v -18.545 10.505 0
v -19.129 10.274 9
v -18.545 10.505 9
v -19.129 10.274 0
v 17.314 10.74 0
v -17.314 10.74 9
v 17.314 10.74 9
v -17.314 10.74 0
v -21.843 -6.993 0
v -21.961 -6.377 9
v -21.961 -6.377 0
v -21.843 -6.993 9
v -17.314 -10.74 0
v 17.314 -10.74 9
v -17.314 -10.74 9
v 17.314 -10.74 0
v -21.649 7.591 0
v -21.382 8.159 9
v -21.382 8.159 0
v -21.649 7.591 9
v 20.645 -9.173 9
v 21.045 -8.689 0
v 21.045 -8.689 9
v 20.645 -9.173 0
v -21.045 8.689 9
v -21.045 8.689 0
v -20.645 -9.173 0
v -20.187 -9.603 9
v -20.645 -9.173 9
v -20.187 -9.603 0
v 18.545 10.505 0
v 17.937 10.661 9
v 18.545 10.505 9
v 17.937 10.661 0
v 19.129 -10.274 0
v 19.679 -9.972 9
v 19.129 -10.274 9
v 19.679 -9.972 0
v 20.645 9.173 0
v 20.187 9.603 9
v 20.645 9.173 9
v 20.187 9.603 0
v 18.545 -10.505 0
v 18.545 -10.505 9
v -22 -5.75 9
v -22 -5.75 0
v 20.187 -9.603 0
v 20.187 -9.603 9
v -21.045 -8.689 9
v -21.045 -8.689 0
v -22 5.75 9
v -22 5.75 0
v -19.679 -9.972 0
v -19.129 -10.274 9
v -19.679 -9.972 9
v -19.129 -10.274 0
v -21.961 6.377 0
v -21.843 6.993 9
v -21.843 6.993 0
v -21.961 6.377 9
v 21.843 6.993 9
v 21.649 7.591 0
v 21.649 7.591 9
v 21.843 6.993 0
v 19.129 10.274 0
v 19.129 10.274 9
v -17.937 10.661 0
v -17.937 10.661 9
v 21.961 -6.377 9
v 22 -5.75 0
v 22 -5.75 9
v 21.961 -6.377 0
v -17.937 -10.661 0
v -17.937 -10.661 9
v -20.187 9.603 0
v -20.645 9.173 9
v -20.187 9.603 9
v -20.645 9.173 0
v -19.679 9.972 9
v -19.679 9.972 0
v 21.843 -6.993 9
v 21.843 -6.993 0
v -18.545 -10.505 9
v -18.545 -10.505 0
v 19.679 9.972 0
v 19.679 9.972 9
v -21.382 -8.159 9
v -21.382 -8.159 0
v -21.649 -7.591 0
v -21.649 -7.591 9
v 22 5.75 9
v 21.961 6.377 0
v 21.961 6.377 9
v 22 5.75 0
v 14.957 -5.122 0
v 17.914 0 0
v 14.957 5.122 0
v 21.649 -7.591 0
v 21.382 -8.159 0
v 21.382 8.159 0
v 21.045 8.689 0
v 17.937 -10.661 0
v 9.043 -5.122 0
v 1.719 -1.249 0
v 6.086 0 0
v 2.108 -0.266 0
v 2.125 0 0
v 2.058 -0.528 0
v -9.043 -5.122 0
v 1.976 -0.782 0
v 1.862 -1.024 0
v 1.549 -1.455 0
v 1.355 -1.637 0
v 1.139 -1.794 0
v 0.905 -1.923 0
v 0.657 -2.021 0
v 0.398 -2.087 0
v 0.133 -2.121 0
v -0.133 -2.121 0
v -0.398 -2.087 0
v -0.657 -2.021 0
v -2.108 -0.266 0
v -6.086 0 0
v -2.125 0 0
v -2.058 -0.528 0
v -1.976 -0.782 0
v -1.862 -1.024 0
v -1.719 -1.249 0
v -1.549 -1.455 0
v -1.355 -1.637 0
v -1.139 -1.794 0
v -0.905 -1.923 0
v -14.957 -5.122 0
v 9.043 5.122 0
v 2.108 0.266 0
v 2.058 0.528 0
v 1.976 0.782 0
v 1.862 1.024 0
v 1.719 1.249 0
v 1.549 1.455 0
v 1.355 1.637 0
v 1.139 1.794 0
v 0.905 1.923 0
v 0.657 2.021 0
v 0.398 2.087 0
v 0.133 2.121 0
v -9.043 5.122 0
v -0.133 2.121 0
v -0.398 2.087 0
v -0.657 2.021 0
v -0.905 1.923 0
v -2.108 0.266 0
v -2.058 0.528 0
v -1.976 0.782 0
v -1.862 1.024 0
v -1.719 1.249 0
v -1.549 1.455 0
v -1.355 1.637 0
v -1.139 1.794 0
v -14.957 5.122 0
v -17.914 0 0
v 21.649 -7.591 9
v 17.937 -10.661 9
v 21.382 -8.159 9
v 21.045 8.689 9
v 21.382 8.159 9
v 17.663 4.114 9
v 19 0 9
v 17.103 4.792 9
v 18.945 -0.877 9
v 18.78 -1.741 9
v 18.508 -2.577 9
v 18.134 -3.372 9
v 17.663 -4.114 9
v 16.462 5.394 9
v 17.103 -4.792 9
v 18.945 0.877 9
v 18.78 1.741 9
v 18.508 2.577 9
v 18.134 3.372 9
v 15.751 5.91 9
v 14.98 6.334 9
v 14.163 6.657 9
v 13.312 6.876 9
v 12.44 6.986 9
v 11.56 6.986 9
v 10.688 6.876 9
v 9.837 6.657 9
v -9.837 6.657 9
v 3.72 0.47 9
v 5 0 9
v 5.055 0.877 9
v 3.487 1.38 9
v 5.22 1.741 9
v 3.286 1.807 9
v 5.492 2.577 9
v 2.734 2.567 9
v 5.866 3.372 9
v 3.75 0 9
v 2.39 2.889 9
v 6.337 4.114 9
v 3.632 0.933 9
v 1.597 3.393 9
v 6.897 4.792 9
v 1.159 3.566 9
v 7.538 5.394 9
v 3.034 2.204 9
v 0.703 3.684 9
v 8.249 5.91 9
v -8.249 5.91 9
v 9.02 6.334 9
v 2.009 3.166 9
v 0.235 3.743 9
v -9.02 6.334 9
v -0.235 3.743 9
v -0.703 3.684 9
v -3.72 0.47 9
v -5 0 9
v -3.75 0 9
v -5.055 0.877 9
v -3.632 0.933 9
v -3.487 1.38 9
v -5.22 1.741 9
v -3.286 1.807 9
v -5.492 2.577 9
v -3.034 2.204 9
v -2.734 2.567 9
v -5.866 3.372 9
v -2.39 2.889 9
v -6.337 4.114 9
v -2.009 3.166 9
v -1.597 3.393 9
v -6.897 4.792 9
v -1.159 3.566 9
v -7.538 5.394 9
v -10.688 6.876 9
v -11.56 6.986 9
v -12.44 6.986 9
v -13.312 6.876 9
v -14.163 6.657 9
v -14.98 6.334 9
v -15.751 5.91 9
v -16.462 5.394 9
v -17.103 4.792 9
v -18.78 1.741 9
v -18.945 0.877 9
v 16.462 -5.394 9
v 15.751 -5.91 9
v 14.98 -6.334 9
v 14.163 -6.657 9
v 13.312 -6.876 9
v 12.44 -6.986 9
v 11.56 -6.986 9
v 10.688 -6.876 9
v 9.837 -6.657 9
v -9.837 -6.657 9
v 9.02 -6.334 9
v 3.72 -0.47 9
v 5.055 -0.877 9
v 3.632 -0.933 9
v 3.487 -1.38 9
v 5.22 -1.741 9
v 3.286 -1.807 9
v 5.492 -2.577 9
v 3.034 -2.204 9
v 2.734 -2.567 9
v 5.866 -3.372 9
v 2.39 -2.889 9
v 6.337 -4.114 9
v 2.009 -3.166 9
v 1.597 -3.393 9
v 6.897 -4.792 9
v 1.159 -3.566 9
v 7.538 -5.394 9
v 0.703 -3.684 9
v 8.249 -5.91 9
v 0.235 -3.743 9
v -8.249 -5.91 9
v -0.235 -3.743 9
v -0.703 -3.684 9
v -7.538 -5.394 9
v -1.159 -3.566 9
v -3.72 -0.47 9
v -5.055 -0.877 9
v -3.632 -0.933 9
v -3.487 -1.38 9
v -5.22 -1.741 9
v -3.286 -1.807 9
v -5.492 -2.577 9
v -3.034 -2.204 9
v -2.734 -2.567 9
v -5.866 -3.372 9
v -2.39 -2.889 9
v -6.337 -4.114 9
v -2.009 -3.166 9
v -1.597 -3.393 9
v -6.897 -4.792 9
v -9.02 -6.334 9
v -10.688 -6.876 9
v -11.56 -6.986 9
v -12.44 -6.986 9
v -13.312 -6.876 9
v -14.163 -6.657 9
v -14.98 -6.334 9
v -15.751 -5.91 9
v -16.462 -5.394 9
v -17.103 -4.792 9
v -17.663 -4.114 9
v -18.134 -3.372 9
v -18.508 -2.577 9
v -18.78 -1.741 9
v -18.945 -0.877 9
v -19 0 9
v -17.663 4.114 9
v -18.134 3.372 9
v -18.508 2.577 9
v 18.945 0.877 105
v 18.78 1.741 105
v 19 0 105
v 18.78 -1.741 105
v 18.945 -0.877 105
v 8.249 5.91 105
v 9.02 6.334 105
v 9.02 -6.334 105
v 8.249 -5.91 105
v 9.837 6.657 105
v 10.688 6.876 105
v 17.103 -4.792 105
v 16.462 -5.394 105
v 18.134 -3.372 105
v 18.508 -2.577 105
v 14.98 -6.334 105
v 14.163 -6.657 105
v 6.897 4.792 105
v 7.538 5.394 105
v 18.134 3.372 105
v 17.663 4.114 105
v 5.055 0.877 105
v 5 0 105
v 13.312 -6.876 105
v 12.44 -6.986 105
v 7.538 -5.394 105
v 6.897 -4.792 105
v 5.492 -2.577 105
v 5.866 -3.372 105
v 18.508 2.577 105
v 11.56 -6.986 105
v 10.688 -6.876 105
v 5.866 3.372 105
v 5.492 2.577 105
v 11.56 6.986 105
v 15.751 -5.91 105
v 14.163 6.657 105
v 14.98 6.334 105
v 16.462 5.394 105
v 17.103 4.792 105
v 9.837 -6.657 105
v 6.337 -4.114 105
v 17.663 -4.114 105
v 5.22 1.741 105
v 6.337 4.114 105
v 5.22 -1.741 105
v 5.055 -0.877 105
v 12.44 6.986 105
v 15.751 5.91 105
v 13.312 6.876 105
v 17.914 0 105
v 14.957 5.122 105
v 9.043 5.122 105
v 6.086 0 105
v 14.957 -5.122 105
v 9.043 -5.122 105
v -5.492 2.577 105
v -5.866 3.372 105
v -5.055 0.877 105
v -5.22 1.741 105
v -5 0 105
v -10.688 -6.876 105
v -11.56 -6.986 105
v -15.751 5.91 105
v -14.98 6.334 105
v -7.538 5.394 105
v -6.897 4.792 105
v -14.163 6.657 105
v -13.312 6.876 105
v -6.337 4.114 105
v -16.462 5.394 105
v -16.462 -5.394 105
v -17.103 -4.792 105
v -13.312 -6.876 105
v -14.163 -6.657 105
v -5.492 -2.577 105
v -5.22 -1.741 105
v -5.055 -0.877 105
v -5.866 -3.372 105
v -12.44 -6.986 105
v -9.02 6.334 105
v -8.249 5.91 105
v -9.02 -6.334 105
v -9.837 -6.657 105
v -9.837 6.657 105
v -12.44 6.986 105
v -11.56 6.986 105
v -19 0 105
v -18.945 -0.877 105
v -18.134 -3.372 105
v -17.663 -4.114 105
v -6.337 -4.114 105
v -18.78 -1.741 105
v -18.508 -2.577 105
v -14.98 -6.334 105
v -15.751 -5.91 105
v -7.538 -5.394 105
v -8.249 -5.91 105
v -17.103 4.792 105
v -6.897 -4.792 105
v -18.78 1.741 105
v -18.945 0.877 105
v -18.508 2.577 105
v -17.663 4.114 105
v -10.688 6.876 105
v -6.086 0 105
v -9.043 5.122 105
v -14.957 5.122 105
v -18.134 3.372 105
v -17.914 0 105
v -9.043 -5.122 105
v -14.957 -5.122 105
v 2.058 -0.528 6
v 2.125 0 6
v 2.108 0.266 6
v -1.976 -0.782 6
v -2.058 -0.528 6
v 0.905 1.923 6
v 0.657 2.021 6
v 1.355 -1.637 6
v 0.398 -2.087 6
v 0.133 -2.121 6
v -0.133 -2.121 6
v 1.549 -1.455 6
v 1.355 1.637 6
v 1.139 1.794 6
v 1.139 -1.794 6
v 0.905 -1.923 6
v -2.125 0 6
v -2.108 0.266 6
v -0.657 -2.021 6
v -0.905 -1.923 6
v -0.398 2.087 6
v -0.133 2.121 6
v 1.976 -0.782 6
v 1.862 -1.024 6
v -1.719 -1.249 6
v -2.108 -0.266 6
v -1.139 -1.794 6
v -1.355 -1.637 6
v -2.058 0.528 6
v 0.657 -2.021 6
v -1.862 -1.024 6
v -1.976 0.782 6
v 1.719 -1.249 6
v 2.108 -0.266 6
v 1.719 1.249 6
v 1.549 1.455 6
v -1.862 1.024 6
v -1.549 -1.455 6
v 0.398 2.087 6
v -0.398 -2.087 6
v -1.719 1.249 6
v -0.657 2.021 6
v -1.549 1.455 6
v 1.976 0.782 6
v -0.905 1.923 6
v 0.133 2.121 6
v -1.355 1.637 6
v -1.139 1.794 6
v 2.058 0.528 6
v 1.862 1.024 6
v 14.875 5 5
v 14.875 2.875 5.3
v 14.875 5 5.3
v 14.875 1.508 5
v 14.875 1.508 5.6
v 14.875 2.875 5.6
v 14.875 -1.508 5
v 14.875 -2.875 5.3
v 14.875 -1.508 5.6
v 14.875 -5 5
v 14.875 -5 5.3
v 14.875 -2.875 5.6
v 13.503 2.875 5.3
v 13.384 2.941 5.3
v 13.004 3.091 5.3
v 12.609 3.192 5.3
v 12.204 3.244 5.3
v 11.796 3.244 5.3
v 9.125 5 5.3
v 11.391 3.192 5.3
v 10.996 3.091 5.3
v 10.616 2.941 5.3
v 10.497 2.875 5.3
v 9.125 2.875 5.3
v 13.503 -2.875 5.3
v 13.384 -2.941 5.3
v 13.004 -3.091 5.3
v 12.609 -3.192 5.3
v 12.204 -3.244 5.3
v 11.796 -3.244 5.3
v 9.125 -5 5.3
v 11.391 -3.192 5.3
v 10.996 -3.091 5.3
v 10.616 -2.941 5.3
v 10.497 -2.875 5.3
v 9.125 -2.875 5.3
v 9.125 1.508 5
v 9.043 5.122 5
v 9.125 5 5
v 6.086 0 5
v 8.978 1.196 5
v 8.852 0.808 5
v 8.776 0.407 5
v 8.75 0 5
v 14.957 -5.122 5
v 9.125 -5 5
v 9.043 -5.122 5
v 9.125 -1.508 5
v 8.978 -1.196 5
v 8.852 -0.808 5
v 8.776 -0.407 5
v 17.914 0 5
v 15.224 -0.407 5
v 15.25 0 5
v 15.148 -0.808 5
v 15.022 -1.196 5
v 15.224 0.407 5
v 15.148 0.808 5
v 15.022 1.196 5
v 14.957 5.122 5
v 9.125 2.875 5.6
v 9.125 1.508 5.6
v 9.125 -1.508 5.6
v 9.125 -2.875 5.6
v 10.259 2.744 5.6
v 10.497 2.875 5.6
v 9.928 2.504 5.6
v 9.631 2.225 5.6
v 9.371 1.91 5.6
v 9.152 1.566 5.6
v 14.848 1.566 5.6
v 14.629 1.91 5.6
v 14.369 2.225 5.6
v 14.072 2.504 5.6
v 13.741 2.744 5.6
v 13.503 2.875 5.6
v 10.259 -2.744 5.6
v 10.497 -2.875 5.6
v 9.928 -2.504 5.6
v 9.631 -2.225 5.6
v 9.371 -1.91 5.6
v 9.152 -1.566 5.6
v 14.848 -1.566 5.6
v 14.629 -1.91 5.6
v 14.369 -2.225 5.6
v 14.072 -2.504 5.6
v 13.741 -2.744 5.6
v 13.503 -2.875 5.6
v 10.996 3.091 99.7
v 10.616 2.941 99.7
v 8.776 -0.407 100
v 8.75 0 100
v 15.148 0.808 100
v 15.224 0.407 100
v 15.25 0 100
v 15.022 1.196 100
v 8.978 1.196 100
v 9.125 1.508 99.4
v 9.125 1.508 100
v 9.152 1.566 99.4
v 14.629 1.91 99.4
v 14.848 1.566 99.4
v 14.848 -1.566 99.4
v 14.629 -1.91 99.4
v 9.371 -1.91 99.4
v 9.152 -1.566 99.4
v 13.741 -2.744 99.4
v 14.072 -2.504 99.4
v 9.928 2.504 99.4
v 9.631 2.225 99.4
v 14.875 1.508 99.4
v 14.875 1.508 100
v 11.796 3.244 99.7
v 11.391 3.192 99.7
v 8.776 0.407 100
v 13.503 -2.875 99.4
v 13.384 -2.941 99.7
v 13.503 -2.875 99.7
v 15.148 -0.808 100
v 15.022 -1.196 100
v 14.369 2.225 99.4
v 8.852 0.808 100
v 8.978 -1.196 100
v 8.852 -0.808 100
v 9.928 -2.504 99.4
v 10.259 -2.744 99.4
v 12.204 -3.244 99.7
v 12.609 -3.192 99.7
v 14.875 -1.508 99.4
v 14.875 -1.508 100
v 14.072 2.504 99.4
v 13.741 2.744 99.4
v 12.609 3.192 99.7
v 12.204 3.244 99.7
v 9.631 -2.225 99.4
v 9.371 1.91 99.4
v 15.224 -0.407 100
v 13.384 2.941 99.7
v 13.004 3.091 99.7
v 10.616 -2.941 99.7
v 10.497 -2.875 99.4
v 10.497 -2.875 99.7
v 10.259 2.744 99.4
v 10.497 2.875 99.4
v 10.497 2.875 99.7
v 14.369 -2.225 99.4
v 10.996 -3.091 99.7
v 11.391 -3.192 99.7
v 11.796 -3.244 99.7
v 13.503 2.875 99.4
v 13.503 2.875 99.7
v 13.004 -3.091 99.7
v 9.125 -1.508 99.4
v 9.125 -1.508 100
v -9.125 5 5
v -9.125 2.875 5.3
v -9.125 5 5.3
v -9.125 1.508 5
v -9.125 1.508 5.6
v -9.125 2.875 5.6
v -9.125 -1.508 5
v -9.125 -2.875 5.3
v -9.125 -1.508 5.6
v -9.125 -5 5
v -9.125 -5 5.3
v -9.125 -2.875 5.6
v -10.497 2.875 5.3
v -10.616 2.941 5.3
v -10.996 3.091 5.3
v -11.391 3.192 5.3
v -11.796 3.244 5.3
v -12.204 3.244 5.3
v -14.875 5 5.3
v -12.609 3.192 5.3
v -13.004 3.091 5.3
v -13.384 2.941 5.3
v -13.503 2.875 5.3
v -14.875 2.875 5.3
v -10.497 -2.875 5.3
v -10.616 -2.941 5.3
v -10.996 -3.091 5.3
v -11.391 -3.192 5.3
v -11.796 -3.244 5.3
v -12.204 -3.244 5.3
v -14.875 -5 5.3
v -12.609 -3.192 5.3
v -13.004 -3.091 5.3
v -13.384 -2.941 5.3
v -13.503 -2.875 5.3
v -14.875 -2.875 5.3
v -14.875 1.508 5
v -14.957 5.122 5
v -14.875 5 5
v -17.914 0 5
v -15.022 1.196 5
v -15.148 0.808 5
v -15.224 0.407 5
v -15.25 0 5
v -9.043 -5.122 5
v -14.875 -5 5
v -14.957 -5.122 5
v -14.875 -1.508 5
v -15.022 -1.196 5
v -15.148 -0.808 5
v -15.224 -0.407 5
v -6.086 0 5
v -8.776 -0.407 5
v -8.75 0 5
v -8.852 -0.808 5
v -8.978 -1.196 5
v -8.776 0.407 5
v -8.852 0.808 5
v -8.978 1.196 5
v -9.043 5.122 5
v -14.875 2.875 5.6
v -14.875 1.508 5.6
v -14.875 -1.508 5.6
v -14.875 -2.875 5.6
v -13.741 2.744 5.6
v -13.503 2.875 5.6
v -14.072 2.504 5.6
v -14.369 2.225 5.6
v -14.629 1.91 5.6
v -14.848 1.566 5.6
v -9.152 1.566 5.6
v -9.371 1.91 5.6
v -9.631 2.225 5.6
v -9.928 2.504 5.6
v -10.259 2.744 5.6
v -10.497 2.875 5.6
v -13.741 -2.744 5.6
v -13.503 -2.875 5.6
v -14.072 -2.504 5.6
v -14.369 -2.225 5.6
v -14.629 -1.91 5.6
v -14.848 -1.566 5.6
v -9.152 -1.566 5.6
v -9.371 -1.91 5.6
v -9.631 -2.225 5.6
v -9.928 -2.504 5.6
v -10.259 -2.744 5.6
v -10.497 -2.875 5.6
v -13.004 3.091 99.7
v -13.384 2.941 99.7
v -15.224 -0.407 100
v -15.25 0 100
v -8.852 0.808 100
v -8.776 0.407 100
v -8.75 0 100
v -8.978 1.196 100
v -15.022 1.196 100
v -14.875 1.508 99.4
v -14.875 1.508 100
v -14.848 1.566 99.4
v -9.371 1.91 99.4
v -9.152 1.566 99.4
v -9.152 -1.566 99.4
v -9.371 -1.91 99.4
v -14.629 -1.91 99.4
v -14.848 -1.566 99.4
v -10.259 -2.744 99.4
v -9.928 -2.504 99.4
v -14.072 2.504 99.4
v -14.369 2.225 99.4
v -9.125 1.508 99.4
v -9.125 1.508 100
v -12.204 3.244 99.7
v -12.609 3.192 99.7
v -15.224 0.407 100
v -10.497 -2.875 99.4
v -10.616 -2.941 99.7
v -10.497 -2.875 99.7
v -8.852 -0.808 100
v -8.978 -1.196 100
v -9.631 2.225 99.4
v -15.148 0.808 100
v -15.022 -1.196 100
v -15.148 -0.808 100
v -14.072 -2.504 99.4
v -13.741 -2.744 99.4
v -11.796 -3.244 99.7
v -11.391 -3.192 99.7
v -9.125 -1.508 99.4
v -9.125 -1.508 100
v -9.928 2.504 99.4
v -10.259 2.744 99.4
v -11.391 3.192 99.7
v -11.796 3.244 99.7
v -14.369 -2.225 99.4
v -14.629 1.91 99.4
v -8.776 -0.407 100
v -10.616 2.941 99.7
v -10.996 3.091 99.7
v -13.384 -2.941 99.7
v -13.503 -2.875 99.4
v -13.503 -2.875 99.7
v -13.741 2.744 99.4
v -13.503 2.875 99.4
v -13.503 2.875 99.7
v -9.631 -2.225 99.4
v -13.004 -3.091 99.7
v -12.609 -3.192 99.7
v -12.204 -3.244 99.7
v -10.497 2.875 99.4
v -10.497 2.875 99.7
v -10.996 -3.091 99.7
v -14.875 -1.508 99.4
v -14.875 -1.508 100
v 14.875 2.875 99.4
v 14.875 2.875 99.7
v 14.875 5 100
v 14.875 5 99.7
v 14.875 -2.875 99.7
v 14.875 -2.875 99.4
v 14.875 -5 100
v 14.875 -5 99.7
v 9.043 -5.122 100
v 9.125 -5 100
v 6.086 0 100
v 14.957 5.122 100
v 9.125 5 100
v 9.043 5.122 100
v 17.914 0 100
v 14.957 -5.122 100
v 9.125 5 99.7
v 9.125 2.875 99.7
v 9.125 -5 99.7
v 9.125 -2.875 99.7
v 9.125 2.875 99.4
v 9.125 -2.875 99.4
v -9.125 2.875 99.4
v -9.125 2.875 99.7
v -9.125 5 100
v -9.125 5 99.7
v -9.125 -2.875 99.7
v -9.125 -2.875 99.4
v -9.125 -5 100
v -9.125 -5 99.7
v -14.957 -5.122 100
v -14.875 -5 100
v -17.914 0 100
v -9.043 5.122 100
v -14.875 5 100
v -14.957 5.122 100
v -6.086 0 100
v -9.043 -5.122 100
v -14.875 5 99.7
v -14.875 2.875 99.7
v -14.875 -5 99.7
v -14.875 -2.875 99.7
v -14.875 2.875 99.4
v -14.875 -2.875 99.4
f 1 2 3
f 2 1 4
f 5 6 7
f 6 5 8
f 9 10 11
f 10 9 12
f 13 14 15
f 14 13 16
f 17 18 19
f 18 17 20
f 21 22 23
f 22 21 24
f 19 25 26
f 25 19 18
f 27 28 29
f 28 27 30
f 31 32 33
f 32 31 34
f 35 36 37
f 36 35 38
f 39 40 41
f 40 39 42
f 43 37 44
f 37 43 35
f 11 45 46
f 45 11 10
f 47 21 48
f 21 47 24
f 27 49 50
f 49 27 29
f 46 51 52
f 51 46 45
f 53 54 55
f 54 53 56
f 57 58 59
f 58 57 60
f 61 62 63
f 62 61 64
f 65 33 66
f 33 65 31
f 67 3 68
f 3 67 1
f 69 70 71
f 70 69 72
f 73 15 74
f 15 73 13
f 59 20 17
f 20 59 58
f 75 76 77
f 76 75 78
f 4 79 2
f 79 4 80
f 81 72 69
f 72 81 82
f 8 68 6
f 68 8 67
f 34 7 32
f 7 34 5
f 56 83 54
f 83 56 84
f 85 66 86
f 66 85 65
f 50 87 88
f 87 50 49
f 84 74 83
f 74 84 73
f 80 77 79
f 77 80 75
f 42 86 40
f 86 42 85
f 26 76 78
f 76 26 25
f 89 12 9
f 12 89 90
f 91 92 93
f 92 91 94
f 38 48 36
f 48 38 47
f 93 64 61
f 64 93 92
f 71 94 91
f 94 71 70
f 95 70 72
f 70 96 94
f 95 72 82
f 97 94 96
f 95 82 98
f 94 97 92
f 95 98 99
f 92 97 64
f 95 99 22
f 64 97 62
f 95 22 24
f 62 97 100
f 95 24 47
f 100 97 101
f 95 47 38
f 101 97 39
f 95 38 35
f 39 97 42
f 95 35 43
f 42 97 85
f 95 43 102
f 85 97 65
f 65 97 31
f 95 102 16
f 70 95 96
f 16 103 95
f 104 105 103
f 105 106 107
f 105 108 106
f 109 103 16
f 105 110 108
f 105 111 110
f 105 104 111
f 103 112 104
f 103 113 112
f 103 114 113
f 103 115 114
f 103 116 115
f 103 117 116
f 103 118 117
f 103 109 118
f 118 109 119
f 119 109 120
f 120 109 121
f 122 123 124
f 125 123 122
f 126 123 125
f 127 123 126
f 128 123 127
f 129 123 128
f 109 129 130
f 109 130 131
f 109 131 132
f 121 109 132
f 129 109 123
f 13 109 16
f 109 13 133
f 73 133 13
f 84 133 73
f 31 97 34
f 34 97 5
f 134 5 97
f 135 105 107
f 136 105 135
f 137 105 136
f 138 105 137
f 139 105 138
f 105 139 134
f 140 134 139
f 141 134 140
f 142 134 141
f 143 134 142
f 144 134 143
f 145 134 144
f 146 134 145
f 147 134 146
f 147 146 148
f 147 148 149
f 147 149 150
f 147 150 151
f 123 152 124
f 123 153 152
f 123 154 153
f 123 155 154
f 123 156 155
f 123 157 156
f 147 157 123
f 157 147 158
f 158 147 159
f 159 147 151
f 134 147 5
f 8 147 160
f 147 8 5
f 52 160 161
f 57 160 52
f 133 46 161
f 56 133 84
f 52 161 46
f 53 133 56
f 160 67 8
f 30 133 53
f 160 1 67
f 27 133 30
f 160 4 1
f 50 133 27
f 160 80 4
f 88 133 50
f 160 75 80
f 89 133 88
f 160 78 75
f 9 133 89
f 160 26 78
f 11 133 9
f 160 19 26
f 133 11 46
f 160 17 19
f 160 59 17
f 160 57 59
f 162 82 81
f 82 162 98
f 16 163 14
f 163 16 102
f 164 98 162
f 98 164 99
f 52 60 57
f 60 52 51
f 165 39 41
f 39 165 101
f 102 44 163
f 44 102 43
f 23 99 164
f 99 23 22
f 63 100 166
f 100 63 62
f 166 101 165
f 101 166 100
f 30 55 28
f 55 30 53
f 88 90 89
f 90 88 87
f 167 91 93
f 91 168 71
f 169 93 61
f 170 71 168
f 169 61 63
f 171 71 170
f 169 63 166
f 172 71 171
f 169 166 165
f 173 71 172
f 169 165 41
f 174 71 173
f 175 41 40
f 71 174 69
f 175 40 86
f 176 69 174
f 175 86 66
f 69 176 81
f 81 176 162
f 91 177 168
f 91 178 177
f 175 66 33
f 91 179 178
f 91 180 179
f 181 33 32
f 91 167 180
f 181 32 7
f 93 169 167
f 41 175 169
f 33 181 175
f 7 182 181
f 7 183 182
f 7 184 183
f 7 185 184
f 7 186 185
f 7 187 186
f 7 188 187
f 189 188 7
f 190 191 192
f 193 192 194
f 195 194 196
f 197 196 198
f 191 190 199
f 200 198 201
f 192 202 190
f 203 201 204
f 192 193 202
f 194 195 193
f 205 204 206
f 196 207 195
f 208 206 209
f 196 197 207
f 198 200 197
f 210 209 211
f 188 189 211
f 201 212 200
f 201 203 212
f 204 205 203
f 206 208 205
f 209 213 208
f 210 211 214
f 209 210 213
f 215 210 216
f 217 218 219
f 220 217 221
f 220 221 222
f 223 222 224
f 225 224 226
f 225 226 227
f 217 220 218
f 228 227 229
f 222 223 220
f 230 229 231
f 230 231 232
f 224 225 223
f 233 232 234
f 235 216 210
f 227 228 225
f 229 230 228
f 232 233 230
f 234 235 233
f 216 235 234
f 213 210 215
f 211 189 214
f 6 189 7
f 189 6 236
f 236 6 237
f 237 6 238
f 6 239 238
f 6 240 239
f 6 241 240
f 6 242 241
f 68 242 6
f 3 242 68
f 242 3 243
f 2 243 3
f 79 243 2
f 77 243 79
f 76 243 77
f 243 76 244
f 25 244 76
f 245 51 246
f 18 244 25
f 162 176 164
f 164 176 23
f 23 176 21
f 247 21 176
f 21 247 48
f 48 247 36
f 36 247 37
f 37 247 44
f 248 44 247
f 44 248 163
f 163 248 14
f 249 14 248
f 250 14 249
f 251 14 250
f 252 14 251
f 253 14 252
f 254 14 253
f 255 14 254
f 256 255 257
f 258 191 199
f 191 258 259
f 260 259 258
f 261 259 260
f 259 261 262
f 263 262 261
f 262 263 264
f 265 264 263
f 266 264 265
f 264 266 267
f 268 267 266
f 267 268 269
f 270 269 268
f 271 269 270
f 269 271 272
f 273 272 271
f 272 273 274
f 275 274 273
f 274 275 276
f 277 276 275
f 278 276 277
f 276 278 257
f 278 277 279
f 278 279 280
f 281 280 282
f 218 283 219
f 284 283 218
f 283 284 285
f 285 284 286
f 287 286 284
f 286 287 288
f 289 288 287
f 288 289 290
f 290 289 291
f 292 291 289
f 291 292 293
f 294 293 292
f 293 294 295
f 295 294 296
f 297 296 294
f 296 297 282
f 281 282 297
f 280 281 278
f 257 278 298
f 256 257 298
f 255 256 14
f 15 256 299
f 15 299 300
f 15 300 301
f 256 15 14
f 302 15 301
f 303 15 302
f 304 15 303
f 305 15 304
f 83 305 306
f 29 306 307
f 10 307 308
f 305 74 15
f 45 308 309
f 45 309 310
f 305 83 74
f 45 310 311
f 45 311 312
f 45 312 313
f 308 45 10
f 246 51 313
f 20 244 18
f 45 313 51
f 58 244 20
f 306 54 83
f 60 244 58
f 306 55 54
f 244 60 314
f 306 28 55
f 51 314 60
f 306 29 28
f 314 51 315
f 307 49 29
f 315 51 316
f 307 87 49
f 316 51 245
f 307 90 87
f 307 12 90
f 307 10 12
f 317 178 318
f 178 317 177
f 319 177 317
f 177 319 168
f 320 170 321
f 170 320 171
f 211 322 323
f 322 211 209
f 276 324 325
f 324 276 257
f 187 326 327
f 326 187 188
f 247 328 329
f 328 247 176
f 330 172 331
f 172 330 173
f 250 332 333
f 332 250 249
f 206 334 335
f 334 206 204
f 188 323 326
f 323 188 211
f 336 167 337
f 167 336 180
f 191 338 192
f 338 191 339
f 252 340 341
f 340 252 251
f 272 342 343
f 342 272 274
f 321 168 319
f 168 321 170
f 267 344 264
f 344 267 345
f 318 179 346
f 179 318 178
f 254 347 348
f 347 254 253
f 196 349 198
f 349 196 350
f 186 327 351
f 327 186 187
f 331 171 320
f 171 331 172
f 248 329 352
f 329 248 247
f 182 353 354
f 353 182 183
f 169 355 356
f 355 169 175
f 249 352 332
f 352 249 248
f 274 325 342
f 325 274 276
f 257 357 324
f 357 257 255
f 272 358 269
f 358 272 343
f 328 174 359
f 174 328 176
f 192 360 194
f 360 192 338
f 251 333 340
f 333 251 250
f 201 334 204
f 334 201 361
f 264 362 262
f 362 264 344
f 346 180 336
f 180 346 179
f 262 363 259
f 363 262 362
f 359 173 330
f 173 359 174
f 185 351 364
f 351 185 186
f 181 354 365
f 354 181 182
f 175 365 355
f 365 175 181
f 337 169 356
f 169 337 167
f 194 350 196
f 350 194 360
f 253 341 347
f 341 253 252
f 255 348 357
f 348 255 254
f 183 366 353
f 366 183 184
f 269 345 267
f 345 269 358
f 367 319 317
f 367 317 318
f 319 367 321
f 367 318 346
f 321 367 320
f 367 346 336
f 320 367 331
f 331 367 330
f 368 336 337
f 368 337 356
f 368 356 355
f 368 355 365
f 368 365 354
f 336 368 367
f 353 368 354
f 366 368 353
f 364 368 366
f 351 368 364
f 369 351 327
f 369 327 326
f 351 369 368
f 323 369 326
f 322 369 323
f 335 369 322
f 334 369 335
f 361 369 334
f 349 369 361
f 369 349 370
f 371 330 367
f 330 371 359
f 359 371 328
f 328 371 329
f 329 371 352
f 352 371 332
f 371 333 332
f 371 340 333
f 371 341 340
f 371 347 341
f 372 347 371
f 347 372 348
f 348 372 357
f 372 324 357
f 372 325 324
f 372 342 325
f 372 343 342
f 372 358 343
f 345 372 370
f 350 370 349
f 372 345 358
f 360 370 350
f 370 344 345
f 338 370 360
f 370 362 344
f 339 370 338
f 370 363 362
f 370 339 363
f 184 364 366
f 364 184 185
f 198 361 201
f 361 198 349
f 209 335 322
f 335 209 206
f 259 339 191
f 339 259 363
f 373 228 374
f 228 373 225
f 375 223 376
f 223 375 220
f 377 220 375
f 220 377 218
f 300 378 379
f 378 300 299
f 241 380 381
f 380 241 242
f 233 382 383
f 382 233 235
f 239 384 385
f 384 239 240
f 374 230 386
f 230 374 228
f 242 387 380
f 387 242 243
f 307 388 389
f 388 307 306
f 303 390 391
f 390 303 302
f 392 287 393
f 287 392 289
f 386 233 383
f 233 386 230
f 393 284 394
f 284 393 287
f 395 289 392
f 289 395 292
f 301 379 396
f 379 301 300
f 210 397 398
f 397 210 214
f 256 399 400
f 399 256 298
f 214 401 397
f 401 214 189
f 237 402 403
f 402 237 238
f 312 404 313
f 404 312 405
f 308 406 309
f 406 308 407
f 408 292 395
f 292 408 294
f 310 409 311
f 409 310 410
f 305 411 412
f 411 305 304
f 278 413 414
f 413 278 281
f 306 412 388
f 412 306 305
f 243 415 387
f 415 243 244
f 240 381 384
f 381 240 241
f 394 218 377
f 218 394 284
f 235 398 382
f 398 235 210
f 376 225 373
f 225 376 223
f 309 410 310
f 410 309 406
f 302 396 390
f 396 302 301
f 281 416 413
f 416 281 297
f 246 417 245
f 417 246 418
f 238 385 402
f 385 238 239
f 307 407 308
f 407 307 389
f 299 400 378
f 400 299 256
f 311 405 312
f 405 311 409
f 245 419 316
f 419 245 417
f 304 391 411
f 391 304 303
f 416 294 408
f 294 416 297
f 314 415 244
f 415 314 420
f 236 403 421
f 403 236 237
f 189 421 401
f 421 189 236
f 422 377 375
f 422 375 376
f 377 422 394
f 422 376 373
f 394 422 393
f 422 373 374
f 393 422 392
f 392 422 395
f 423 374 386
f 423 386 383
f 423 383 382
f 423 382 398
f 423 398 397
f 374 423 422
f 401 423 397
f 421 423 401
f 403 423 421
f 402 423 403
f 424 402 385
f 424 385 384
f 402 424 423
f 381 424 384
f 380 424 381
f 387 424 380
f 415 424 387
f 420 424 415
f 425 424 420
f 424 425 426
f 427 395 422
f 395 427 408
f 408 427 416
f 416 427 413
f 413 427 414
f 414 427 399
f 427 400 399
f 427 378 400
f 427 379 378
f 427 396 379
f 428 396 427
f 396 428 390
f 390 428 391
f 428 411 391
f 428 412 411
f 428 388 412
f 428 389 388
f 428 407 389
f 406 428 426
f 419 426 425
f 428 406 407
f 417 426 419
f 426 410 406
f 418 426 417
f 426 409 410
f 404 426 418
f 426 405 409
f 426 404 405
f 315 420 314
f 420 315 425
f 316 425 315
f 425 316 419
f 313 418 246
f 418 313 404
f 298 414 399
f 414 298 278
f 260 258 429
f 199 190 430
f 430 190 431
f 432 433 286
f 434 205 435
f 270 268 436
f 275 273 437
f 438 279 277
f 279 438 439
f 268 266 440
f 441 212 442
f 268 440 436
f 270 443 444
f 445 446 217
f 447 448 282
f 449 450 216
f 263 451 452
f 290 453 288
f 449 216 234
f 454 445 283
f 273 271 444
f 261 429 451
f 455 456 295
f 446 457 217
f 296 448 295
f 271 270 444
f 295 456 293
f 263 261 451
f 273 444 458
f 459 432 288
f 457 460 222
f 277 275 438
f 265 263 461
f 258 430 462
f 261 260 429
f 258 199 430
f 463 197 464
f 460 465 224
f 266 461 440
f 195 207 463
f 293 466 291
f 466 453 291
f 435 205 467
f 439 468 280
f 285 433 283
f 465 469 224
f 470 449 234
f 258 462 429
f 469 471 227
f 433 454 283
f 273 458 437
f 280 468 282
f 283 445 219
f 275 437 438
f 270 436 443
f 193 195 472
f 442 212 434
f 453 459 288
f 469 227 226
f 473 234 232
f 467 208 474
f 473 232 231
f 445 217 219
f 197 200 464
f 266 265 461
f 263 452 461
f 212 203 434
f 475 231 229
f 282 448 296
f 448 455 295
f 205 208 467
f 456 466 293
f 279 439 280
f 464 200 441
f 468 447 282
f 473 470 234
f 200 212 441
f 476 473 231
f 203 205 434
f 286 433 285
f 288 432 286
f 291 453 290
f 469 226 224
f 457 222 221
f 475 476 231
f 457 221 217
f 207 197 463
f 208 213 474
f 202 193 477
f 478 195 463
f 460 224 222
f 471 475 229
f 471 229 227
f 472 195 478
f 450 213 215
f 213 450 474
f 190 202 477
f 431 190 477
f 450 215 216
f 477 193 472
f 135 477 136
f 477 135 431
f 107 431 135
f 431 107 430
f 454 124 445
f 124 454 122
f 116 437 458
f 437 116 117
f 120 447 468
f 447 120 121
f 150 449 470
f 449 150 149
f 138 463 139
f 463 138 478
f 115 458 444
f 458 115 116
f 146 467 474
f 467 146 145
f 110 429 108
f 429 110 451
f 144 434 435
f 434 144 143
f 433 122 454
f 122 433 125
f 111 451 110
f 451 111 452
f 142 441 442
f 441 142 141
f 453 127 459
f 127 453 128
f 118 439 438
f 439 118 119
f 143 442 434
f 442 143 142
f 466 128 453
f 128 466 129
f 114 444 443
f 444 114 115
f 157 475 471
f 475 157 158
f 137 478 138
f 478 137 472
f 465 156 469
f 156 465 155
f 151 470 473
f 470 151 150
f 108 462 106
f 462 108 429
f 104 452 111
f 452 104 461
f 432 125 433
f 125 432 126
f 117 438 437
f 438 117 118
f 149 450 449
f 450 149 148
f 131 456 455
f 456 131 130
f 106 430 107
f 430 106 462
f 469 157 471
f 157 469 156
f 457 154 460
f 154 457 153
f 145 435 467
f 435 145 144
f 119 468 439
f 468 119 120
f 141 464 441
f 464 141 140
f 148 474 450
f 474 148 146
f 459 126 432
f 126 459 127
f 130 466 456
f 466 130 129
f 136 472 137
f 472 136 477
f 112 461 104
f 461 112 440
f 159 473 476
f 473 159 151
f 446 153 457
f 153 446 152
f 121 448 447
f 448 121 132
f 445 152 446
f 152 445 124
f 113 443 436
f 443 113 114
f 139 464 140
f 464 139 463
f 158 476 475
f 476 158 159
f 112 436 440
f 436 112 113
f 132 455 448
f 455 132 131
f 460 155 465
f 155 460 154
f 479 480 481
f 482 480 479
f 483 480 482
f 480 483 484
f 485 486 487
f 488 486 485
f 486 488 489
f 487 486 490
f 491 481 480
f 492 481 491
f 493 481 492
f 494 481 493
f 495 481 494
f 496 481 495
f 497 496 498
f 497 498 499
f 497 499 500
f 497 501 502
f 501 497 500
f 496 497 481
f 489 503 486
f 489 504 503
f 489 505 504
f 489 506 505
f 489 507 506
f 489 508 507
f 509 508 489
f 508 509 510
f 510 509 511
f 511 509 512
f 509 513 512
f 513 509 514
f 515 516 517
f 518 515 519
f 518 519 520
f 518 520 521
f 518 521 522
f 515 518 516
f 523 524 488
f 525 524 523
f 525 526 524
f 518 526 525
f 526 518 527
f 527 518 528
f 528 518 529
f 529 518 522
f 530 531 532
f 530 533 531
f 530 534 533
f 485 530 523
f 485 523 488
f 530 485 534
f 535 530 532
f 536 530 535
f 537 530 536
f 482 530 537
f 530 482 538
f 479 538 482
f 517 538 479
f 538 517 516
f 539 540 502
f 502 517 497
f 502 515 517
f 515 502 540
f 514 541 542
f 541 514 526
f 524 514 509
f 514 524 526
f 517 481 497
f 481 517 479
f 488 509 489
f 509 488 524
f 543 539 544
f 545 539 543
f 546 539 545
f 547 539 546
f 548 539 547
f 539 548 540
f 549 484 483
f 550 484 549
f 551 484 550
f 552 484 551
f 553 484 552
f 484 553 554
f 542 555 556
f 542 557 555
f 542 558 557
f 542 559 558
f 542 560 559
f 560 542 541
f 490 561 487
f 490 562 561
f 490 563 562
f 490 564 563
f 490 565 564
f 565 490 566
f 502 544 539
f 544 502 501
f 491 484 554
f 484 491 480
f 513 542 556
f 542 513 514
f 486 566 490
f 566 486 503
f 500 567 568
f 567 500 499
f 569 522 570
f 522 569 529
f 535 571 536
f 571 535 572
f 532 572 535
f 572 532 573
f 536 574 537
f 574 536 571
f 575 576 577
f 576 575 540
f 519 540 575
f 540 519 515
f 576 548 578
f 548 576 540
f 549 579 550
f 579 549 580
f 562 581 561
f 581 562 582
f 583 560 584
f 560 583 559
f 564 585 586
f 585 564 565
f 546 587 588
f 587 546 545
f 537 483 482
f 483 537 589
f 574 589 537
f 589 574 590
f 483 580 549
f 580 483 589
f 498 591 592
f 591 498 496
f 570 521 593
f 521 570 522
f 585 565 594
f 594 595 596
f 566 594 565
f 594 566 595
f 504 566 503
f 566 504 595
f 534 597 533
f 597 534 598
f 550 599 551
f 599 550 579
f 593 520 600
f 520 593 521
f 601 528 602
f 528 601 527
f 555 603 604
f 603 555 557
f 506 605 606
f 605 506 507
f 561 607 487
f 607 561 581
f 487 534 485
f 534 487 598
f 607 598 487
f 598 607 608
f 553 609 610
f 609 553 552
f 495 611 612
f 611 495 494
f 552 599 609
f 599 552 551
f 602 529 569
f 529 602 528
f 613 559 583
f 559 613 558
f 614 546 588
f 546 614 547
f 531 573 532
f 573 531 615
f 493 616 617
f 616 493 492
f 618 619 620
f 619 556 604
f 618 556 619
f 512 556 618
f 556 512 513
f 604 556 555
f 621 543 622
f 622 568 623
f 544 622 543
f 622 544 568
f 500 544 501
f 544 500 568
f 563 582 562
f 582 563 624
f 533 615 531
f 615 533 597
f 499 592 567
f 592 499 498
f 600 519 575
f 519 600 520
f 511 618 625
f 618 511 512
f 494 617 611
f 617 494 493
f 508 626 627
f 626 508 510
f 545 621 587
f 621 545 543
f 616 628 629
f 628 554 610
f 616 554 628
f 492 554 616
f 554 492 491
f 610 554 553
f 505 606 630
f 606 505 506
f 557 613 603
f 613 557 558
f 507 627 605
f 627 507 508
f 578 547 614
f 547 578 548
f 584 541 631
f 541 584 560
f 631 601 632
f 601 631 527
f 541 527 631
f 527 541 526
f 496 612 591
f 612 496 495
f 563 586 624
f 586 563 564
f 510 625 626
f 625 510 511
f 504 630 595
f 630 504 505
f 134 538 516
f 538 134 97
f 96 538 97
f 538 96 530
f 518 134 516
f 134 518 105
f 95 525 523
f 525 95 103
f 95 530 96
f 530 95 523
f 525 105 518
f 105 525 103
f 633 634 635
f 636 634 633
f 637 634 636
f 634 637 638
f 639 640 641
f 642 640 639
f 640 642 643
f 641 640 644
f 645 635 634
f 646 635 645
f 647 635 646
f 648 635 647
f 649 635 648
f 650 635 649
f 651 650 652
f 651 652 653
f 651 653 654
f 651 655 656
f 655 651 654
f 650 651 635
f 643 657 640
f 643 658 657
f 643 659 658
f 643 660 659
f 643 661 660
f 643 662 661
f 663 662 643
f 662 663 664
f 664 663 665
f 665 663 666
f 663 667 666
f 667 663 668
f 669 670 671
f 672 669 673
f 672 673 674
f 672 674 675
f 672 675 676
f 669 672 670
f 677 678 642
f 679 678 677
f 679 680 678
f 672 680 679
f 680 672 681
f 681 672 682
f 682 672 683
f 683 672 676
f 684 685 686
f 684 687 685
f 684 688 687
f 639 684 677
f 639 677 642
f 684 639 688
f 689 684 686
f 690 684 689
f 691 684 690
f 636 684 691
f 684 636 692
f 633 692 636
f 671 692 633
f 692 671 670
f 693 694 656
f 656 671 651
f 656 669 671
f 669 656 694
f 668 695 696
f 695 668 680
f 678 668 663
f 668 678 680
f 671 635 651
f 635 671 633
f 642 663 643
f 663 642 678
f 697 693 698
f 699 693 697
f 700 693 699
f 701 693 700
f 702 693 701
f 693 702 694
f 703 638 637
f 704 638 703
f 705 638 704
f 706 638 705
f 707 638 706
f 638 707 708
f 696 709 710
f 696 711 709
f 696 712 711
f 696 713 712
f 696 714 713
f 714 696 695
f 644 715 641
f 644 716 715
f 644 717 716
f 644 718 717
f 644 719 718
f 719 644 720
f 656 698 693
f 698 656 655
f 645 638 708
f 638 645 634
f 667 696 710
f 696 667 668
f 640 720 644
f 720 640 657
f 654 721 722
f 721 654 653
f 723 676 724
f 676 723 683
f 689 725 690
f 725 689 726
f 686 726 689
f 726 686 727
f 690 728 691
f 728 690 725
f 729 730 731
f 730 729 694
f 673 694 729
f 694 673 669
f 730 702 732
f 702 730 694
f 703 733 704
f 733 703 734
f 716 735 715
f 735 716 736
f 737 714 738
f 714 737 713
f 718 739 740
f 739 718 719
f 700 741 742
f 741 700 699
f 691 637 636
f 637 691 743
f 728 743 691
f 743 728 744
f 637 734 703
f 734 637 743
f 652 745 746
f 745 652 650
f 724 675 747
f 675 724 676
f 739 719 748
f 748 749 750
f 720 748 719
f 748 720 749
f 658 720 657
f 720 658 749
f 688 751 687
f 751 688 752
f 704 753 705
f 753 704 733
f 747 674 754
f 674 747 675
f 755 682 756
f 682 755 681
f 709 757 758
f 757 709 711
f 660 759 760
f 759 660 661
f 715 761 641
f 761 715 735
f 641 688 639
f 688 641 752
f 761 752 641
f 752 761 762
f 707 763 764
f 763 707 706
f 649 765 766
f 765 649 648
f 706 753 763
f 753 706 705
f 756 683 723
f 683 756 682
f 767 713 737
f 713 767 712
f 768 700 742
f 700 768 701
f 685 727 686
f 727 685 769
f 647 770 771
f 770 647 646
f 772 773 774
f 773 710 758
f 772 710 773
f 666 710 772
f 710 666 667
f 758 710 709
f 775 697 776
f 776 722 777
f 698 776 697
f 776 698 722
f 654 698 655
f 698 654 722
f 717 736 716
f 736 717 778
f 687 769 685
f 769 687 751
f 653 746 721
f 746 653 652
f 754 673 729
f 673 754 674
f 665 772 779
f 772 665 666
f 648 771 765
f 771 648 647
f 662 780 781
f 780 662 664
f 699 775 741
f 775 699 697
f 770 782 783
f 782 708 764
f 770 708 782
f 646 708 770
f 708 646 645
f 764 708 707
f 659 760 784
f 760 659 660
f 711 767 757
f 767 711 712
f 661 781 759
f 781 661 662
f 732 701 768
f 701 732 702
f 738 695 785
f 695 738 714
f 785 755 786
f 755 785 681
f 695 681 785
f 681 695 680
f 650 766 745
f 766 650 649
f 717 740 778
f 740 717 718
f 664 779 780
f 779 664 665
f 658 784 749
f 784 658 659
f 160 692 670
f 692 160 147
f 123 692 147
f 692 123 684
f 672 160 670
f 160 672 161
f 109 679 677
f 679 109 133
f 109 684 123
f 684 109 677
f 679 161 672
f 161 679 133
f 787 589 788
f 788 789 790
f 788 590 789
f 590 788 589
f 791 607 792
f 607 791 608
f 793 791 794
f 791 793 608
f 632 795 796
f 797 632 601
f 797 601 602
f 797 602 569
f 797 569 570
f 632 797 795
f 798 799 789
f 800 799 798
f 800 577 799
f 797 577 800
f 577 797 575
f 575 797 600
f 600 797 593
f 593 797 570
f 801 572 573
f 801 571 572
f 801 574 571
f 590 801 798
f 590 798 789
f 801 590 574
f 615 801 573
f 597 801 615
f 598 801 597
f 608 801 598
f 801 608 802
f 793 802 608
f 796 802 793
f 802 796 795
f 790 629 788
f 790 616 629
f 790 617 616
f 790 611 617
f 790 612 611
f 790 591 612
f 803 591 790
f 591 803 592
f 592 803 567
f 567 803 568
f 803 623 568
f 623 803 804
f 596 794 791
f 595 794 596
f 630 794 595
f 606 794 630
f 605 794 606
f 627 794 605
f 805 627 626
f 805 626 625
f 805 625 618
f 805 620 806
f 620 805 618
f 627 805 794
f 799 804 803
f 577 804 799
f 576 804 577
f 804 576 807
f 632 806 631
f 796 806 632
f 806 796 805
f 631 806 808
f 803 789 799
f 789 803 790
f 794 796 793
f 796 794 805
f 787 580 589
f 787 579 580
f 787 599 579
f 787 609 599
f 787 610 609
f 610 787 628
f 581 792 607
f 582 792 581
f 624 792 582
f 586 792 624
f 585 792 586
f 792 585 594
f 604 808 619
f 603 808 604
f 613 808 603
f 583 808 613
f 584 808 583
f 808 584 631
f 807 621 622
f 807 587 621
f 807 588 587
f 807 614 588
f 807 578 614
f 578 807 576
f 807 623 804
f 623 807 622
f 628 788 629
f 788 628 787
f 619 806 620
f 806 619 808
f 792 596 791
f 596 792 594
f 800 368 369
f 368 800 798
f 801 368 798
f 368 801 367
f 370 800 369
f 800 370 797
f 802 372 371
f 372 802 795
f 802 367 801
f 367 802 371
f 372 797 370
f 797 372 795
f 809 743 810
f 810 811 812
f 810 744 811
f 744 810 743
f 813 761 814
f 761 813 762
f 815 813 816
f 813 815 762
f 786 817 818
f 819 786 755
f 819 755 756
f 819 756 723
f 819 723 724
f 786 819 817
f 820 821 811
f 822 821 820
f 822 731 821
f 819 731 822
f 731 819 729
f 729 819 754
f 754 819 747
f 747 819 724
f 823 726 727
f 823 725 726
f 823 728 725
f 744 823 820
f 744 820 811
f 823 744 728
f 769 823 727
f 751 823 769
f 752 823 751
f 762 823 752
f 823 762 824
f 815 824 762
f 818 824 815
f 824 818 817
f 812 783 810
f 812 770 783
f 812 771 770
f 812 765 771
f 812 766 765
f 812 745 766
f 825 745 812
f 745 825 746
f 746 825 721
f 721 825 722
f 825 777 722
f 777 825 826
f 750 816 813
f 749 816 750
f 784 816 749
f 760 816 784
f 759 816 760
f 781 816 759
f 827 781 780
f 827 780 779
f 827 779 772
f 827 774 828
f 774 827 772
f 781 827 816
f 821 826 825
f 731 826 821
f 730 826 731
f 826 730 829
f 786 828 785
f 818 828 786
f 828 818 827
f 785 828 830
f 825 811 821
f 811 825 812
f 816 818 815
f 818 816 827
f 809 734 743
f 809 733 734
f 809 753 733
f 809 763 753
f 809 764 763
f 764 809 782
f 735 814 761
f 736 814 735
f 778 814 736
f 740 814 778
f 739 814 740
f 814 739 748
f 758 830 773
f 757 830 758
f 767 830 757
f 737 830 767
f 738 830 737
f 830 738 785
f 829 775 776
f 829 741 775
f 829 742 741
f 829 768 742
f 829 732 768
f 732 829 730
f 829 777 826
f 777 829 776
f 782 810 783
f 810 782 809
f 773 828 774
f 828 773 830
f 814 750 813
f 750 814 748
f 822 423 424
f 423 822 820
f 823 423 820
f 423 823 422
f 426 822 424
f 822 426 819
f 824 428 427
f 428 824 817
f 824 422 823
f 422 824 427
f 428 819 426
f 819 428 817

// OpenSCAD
$fn = 50;


difference() {
	union() {
		hull() {
			translate(v = [-17.0000000000, 5.7500000000, 0]) {
				cylinder(h = 9, r = 5);
			}
			translate(v = [17.0000000000, 5.7500000000, 0]) {
				cylinder(h = 9, r = 5);
			}
			translate(v = [-17.0000000000, -5.7500000000, 0]) {
				cylinder(h = 9, r = 5);
			}
			translate(v = [17.0000000000, -5.7500000000, 0]) {
				cylinder(h = 9, r = 5);
			}
		}
		translate(v = [12.0000000000, 0, 0.0000000000]) {
			cylinder(h = 105, r = 7.0000000000);
		}
		translate(v = [-12.0000000000, 0, 0.0000000000]) {
			cylinder(h = 105, r = 7.0000000000);
		}
	}
	union() {
		translate(v = [0, 0, 9]) {
			rotate(a = [0, 0, 0]) {
				difference() {
					union() {
						#translate(v = [0, 0, -100.0000000000]) {
							cylinder(h = 100, r = 2.0000000000);
						}
						#translate(v = [0, 0, -3]) {
							cylinder(h = 3, r1 = 2.1250000000, r2 = 3.7500000000);
						}
						#translate(v = [0, 0, -100.0000000000]) {
							cylinder(h = 100, r = 2.1250000000);
						}
						#translate(v = [0, 0, -100.0000000000]) {
							cylinder(h = 100, r = 2.0000000000);
						}
					}
					union();
				}
			}
		}
		translate(v = [12.0000000000, 0, 0]) {
			rotate(a = [0, 0, 0]) {
				difference() {
					union() {
						#translate(v = [-2.8750000000, -5.0000000000, -0.3000000000]) {
							cube(size = [5.7500000000, 10, 0.3000000000]);
						}
						#translate(v = [-2.8750000000, -2.8750000000, -0.6000000000]) {
							cube(size = [5.7500000000, 5.7500000000, 0.3000000000]);
						}
						#translate(v = [-2.8750000000, -5.0000000000, 5]) {
							cube(size = [5.7500000000, 10, 0.3000000000]);
						}
						#translate(v = [-2.8750000000, -2.8750000000, 5.3000000000]) {
							cube(size = [5.7500000000, 5.7500000000, 0.3000000000]);
						}
						#translate(v = [0, 0, -100.0000000000]) {
							cylinder(h = 200, r = 3.2500000000);
						}
						#linear_extrude(height = 5) {
							polygon(points = [[5.9142500000, 0.0000000000], [2.9571250000, 5.1218907443], [-2.9571250000, 5.1218907443], [-5.9142500000, 0.0000000000], [-2.9571250000, -5.1218907443], [2.9571250000, -5.1218907443]]);
						}
						#translate(v = [-2.8750000000, -5.0000000000, -0.3000000000]) {
							cube(size = [5.7500000000, 10, 0.3000000000]);
						}
						#translate(v = [-2.8750000000, -2.8750000000, -0.6000000000]) {
							cube(size = [5.7500000000, 5.7500000000, 0.3000000000]);
						}
						#translate(v = [-2.8750000000, -5.0000000000, 5]) {
							cube(size = [5.7500000000, 10, 0.3000000000]);
						}
						#translate(v = [-2.8750000000, -2.8750000000, 5.3000000000]) {
							cube(size = [5.7500000000, 5.7500000000, 0.3000000000]);
						}
						#translate(v = [0, 0, -100.0000000000]) {
							cylinder(h = 200, r = 3.2500000000);
						}
						#translate(v = [-2.8750000000, -5.0000000000, -0.3000000000]) {
							cube(size = [5.7500000000, 10, 0.3000000000]);
						}
						#translate(v = [-2.8750000000, -2.8750000000, -0.6000000000]) {
							cube(size = [5.7500000000, 5.7500000000, 0.3000000000]);
						}
						#translate(v = [-2.8750000000, -5.0000000000, 5]) {
							cube(size = [5.7500000000, 10, 0.3000000000]);
						}
						#translate(v = [-2.8750000000, -2.8750000000, 5.3000000000]) {
							cube(size = [5.7500000000, 5.7500000000, 0.3000000000]);
						}
						#translate(v = [0, 0, -100.0000000000]) {
							cylinder(h = 200, r = 3.2500000000);
						}
					}
					union();
				}
			}
		}
		translate(v = [-12.0000000000, 0, 0]) {
			rotate(a = [0, 0, 0]) {
				difference() {
					union() {
						#translate(v = [-2.8750000000, -5.0000000000, -0.3000000000]) {
							cube(size = [5.7500000000, 10, 0.3000000000]);
						}
						#translate(v = [-2.8750000000, -2.8750000000, -0.6000000000]) {
							cube(size = [5.7500000000, 5.7500000000, 0.3000000000]);
						}
						#translate(v = [-2.8750000000, -5.0000000000, 5]) {
							cube(size = [5.7500000000, 10, 0.3000000000]);
						}
						#translate(v = [-2.8750000000, -2.8750000000, 5.3000000000]) {
							cube(size = [5.7500000000, 5.7500000000, 0.3000000000]);
						}
						#translate(v = [0, 0, -100.0000000000]) {
							cylinder(h = 200, r = 3.2500000000);
						}
						#linear_extrude(height = 5) {
							polygon(points = [[5.9142500000, 0.0000000000], [2.9571250000, 5.1218907443], [-2.9571250000, 5.1218907443], [-5.9142500000, 0.0000000000], [-2.9571250000, -5.1218907443], [2.9571250000, -5.1218907443]]);
						}
						#translate(v = [-2.8750000000, -5.0000000000, -0.3000000000]) {
							cube(size = [5.7500000000, 10, 0.3000000000]);
						}
						#translate(v = [-2.8750000000, -2.8750000000, -0.6000000000]) {
							cube(size = [5.7500000000, 5.7500000000, 0.3000000000]);
						}
						#translate(v = [-2.8750000000, -5.0000000000, 5]) {
							cube(size = [5.7500000000, 10, 0.3000000000]);
						}
						#translate(v = [-2.8750000000, -2.8750000000, 5.3000000000]) {
							cube(size = [5.7500000000, 5.7500000000, 0.3000000000]);
						}
						#translate(v = [0, 0, -100.0000000000]) {
							cylinder(h = 200, r = 3.2500000000);
						}
						#translate(v = [-2.8750000000, -5.0000000000, -0.3000000000]) {
							cube(size = [5.7500000000, 10, 0.3000000000]);
						}
						#translate(v = [-2.8750000000, -2.8750000000, -0.6000000000]) {
							cube(size = [5.7500000000, 5.7500000000, 0.3000000000]);
						}
						#translate(v = [-2.8750000000, -5.0000000000, 5]) {
							cube(size = [5.7500000000, 10, 0.3000000000]);
						}
						#translate(v = [-2.8750000000, -2.8750000000, 5.3000000000]) {
							cube(size = [5.7500000000, 5.7500000000, 0.3000000000]);
						}
						#translate(v = [0, 0, -100.0000000000]) {
							cylinder(h = 200, r = 3.2500000000);
						}
					}
					union();
				}
			}
		}
		translate(v = [12.0000000000, 0, 105]) {
			rotate(a = [0, 0, 0]) {
				difference() {
					union() {
						#translate(v = [-2.8750000000, -5.0000000000, -5.3000000000]) {
							cube(size = [5.7500000000, 10, 0.3000000000]);
						}
						#translate(v = [-2.8750000000, -2.8750000000, -5.6000000000]) {
							cube(size = [5.7500000000, 5.7500000000, 0.3000000000]);
						}
						#translate(v = [-2.8750000000, -5.0000000000, 0]) {
							cube(size = [5.7500000000, 10, 0.3000000000]);
						}
						#translate(v = [-2.8750000000, -2.8750000000, 0.3000000000]) {
							cube(size = [5.7500000000, 5.7500000000, 0.3000000000]);
						}
						#translate(v = [0, 0, -100.0000000000]) {
							cylinder(h = 200, r = 3.2500000000);
						}
						translate(v = [0, 0, -5]) {
							#linear_extrude(height = 5) {
								polygon(points = [[5.9142500000, 0.0000000000], [2.9571250000, 5.1218907443], [-2.9571250000, 5.1218907443], [-5.9142500000, 0.0000000000], [-2.9571250000, -5.1218907443], [2.9571250000, -5.1218907443]]);
							}
						}
						#translate(v = [-2.8750000000, -5.0000000000, -5.3000000000]) {
							cube(size = [5.7500000000, 10, 0.3000000000]);
						}
						#translate(v = [-2.8750000000, -2.8750000000, -5.6000000000]) {
							cube(size = [5.7500000000, 5.7500000000, 0.3000000000]);
						}
						#translate(v = [-2.8750000000, -5.0000000000, 0]) {
							cube(size = [5.7500000000, 10, 0.3000000000]);
						}
						#translate(v = [-2.8750000000, -2.8750000000, 0.3000000000]) {
							cube(size = [5.7500000000, 5.7500000000, 0.3000000000]);
						}
						#translate(v = [0, 0, -100.0000000000]) {
							cylinder(h = 200, r = 3.2500000000);
						}
						#translate(v = [-2.8750000000, -5.0000000000, -5.3000000000]) {
							cube(size = [5.7500000000, 10, 0.3000000000]);
						}
						#translate(v = [-2.8750000000, -2.8750000000, -5.6000000000]) {
							cube(size = [5.7500000000, 5.7500000000, 0.3000000000]);
						}
						#translate(v = [-2.8750000000, -5.0000000000, 0]) {
							cube(size = [5.7500000000, 10, 0.3000000000]);
						}
						#translate(v = [-2.8750000000, -2.8750000000, 0.3000000000]) {
							cube(size = [5.7500000000, 5.7500000000, 0.3000000000]);
						}
						#translate(v = [0, 0, -100.0000000000]) {
							cylinder(h = 200, r = 3.2500000000);
						}
					}
					union();
				}
			}
		}
		translate(v = [-12.0000000000, 0, 105]) {
			rotate(a = [0, 0, 0]) {
				difference() {
					union() {
						#translate(v = [-2.8750000000, -5.0000000000, -5.3000000000]) {
							cube(size = [5.7500000000, 10, 0.3000000000]);
						}
						#translate(v = [-2.8750000000, -2.8750000000, -5.6000000000]) {
							cube(size = [5.7500000000, 5.7500000000, 0.3000000000]);
						}
						#translate(v = [-2.8750000000, -5.0000000000, 0]) {
							cube(size = [5.7500000000, 10, 0.3000000000]);
						}
						#translate(v = [-2.8750000000, -2.8750000000, 0.3000000000]) {
							cube(size = [5.7500000000, 5.7500000000, 0.3000000000]);
						}
						#translate(v = [0, 0, -100.0000000000]) {
							cylinder(h = 200, r = 3.2500000000);
						}
						translate(v = [0, 0, -5]) {
							#linear_extrude(height = 5) {
								polygon(points = [[5.9142500000, 0.0000000000], [2.9571250000, 5.1218907443], [-2.9571250000, 5.1218907443], [-5.9142500000, 0.0000000000], [-2.9571250000, -5.1218907443], [2.9571250000, -5.1218907443]]);
							}
						}
						#translate(v = [-2.8750000000, -5.0000000000, -5.3000000000]) {
							cube(size = [5.7500000000, 10, 0.3000000000]);
						}
						#translate(v = [-2.8750000000, -2.8750000000, -5.6000000000]) {
							cube(size = [5.7500000000, 5.7500000000, 0.3000000000]);
						}
						#translate(v = [-2.8750000000, -5.0000000000, 0]) {
							cube(size = [5.7500000000, 10, 0.3000000000]);
						}
						#translate(v = [-2.8750000000, -2.8750000000, 0.3000000000]) {
							cube(size = [5.7500000000, 5.7500000000, 0.3000000000]);
						}
						#translate(v = [0, 0, -100.0000000000]) {
							cylinder(h = 200, r = 3.2500000000);
						}
						#translate(v = [-2.8750000000, -5.0000000000, -5.3000000000]) {
							cube(size = [5.7500000000, 10, 0.3000000000]);
						}
						#translate(v = [-2.8750000000, -2.8750000000, -5.6000000000]) {
							cube(size = [5.7500000000, 5.7500000000, 0.3000000000]);
						}
						#translate(v = [-2.8750000000, -5.0000000000, 0]) {
							cube(size = [5.7500000000, 10, 0.3000000000]);
						}
						#translate(v = [-2.8750000000, -2.8750000000, 0.3000000000]) {
							cube(size = [5.7500000000, 5.7500000000, 0.3000000000]);
						}
						#translate(v = [0, 0, -100.0000000000]) {
							cylinder(h = 200, r = 3.2500000000);
						}
					}
					union();
				}
			}
		}
	}
}
